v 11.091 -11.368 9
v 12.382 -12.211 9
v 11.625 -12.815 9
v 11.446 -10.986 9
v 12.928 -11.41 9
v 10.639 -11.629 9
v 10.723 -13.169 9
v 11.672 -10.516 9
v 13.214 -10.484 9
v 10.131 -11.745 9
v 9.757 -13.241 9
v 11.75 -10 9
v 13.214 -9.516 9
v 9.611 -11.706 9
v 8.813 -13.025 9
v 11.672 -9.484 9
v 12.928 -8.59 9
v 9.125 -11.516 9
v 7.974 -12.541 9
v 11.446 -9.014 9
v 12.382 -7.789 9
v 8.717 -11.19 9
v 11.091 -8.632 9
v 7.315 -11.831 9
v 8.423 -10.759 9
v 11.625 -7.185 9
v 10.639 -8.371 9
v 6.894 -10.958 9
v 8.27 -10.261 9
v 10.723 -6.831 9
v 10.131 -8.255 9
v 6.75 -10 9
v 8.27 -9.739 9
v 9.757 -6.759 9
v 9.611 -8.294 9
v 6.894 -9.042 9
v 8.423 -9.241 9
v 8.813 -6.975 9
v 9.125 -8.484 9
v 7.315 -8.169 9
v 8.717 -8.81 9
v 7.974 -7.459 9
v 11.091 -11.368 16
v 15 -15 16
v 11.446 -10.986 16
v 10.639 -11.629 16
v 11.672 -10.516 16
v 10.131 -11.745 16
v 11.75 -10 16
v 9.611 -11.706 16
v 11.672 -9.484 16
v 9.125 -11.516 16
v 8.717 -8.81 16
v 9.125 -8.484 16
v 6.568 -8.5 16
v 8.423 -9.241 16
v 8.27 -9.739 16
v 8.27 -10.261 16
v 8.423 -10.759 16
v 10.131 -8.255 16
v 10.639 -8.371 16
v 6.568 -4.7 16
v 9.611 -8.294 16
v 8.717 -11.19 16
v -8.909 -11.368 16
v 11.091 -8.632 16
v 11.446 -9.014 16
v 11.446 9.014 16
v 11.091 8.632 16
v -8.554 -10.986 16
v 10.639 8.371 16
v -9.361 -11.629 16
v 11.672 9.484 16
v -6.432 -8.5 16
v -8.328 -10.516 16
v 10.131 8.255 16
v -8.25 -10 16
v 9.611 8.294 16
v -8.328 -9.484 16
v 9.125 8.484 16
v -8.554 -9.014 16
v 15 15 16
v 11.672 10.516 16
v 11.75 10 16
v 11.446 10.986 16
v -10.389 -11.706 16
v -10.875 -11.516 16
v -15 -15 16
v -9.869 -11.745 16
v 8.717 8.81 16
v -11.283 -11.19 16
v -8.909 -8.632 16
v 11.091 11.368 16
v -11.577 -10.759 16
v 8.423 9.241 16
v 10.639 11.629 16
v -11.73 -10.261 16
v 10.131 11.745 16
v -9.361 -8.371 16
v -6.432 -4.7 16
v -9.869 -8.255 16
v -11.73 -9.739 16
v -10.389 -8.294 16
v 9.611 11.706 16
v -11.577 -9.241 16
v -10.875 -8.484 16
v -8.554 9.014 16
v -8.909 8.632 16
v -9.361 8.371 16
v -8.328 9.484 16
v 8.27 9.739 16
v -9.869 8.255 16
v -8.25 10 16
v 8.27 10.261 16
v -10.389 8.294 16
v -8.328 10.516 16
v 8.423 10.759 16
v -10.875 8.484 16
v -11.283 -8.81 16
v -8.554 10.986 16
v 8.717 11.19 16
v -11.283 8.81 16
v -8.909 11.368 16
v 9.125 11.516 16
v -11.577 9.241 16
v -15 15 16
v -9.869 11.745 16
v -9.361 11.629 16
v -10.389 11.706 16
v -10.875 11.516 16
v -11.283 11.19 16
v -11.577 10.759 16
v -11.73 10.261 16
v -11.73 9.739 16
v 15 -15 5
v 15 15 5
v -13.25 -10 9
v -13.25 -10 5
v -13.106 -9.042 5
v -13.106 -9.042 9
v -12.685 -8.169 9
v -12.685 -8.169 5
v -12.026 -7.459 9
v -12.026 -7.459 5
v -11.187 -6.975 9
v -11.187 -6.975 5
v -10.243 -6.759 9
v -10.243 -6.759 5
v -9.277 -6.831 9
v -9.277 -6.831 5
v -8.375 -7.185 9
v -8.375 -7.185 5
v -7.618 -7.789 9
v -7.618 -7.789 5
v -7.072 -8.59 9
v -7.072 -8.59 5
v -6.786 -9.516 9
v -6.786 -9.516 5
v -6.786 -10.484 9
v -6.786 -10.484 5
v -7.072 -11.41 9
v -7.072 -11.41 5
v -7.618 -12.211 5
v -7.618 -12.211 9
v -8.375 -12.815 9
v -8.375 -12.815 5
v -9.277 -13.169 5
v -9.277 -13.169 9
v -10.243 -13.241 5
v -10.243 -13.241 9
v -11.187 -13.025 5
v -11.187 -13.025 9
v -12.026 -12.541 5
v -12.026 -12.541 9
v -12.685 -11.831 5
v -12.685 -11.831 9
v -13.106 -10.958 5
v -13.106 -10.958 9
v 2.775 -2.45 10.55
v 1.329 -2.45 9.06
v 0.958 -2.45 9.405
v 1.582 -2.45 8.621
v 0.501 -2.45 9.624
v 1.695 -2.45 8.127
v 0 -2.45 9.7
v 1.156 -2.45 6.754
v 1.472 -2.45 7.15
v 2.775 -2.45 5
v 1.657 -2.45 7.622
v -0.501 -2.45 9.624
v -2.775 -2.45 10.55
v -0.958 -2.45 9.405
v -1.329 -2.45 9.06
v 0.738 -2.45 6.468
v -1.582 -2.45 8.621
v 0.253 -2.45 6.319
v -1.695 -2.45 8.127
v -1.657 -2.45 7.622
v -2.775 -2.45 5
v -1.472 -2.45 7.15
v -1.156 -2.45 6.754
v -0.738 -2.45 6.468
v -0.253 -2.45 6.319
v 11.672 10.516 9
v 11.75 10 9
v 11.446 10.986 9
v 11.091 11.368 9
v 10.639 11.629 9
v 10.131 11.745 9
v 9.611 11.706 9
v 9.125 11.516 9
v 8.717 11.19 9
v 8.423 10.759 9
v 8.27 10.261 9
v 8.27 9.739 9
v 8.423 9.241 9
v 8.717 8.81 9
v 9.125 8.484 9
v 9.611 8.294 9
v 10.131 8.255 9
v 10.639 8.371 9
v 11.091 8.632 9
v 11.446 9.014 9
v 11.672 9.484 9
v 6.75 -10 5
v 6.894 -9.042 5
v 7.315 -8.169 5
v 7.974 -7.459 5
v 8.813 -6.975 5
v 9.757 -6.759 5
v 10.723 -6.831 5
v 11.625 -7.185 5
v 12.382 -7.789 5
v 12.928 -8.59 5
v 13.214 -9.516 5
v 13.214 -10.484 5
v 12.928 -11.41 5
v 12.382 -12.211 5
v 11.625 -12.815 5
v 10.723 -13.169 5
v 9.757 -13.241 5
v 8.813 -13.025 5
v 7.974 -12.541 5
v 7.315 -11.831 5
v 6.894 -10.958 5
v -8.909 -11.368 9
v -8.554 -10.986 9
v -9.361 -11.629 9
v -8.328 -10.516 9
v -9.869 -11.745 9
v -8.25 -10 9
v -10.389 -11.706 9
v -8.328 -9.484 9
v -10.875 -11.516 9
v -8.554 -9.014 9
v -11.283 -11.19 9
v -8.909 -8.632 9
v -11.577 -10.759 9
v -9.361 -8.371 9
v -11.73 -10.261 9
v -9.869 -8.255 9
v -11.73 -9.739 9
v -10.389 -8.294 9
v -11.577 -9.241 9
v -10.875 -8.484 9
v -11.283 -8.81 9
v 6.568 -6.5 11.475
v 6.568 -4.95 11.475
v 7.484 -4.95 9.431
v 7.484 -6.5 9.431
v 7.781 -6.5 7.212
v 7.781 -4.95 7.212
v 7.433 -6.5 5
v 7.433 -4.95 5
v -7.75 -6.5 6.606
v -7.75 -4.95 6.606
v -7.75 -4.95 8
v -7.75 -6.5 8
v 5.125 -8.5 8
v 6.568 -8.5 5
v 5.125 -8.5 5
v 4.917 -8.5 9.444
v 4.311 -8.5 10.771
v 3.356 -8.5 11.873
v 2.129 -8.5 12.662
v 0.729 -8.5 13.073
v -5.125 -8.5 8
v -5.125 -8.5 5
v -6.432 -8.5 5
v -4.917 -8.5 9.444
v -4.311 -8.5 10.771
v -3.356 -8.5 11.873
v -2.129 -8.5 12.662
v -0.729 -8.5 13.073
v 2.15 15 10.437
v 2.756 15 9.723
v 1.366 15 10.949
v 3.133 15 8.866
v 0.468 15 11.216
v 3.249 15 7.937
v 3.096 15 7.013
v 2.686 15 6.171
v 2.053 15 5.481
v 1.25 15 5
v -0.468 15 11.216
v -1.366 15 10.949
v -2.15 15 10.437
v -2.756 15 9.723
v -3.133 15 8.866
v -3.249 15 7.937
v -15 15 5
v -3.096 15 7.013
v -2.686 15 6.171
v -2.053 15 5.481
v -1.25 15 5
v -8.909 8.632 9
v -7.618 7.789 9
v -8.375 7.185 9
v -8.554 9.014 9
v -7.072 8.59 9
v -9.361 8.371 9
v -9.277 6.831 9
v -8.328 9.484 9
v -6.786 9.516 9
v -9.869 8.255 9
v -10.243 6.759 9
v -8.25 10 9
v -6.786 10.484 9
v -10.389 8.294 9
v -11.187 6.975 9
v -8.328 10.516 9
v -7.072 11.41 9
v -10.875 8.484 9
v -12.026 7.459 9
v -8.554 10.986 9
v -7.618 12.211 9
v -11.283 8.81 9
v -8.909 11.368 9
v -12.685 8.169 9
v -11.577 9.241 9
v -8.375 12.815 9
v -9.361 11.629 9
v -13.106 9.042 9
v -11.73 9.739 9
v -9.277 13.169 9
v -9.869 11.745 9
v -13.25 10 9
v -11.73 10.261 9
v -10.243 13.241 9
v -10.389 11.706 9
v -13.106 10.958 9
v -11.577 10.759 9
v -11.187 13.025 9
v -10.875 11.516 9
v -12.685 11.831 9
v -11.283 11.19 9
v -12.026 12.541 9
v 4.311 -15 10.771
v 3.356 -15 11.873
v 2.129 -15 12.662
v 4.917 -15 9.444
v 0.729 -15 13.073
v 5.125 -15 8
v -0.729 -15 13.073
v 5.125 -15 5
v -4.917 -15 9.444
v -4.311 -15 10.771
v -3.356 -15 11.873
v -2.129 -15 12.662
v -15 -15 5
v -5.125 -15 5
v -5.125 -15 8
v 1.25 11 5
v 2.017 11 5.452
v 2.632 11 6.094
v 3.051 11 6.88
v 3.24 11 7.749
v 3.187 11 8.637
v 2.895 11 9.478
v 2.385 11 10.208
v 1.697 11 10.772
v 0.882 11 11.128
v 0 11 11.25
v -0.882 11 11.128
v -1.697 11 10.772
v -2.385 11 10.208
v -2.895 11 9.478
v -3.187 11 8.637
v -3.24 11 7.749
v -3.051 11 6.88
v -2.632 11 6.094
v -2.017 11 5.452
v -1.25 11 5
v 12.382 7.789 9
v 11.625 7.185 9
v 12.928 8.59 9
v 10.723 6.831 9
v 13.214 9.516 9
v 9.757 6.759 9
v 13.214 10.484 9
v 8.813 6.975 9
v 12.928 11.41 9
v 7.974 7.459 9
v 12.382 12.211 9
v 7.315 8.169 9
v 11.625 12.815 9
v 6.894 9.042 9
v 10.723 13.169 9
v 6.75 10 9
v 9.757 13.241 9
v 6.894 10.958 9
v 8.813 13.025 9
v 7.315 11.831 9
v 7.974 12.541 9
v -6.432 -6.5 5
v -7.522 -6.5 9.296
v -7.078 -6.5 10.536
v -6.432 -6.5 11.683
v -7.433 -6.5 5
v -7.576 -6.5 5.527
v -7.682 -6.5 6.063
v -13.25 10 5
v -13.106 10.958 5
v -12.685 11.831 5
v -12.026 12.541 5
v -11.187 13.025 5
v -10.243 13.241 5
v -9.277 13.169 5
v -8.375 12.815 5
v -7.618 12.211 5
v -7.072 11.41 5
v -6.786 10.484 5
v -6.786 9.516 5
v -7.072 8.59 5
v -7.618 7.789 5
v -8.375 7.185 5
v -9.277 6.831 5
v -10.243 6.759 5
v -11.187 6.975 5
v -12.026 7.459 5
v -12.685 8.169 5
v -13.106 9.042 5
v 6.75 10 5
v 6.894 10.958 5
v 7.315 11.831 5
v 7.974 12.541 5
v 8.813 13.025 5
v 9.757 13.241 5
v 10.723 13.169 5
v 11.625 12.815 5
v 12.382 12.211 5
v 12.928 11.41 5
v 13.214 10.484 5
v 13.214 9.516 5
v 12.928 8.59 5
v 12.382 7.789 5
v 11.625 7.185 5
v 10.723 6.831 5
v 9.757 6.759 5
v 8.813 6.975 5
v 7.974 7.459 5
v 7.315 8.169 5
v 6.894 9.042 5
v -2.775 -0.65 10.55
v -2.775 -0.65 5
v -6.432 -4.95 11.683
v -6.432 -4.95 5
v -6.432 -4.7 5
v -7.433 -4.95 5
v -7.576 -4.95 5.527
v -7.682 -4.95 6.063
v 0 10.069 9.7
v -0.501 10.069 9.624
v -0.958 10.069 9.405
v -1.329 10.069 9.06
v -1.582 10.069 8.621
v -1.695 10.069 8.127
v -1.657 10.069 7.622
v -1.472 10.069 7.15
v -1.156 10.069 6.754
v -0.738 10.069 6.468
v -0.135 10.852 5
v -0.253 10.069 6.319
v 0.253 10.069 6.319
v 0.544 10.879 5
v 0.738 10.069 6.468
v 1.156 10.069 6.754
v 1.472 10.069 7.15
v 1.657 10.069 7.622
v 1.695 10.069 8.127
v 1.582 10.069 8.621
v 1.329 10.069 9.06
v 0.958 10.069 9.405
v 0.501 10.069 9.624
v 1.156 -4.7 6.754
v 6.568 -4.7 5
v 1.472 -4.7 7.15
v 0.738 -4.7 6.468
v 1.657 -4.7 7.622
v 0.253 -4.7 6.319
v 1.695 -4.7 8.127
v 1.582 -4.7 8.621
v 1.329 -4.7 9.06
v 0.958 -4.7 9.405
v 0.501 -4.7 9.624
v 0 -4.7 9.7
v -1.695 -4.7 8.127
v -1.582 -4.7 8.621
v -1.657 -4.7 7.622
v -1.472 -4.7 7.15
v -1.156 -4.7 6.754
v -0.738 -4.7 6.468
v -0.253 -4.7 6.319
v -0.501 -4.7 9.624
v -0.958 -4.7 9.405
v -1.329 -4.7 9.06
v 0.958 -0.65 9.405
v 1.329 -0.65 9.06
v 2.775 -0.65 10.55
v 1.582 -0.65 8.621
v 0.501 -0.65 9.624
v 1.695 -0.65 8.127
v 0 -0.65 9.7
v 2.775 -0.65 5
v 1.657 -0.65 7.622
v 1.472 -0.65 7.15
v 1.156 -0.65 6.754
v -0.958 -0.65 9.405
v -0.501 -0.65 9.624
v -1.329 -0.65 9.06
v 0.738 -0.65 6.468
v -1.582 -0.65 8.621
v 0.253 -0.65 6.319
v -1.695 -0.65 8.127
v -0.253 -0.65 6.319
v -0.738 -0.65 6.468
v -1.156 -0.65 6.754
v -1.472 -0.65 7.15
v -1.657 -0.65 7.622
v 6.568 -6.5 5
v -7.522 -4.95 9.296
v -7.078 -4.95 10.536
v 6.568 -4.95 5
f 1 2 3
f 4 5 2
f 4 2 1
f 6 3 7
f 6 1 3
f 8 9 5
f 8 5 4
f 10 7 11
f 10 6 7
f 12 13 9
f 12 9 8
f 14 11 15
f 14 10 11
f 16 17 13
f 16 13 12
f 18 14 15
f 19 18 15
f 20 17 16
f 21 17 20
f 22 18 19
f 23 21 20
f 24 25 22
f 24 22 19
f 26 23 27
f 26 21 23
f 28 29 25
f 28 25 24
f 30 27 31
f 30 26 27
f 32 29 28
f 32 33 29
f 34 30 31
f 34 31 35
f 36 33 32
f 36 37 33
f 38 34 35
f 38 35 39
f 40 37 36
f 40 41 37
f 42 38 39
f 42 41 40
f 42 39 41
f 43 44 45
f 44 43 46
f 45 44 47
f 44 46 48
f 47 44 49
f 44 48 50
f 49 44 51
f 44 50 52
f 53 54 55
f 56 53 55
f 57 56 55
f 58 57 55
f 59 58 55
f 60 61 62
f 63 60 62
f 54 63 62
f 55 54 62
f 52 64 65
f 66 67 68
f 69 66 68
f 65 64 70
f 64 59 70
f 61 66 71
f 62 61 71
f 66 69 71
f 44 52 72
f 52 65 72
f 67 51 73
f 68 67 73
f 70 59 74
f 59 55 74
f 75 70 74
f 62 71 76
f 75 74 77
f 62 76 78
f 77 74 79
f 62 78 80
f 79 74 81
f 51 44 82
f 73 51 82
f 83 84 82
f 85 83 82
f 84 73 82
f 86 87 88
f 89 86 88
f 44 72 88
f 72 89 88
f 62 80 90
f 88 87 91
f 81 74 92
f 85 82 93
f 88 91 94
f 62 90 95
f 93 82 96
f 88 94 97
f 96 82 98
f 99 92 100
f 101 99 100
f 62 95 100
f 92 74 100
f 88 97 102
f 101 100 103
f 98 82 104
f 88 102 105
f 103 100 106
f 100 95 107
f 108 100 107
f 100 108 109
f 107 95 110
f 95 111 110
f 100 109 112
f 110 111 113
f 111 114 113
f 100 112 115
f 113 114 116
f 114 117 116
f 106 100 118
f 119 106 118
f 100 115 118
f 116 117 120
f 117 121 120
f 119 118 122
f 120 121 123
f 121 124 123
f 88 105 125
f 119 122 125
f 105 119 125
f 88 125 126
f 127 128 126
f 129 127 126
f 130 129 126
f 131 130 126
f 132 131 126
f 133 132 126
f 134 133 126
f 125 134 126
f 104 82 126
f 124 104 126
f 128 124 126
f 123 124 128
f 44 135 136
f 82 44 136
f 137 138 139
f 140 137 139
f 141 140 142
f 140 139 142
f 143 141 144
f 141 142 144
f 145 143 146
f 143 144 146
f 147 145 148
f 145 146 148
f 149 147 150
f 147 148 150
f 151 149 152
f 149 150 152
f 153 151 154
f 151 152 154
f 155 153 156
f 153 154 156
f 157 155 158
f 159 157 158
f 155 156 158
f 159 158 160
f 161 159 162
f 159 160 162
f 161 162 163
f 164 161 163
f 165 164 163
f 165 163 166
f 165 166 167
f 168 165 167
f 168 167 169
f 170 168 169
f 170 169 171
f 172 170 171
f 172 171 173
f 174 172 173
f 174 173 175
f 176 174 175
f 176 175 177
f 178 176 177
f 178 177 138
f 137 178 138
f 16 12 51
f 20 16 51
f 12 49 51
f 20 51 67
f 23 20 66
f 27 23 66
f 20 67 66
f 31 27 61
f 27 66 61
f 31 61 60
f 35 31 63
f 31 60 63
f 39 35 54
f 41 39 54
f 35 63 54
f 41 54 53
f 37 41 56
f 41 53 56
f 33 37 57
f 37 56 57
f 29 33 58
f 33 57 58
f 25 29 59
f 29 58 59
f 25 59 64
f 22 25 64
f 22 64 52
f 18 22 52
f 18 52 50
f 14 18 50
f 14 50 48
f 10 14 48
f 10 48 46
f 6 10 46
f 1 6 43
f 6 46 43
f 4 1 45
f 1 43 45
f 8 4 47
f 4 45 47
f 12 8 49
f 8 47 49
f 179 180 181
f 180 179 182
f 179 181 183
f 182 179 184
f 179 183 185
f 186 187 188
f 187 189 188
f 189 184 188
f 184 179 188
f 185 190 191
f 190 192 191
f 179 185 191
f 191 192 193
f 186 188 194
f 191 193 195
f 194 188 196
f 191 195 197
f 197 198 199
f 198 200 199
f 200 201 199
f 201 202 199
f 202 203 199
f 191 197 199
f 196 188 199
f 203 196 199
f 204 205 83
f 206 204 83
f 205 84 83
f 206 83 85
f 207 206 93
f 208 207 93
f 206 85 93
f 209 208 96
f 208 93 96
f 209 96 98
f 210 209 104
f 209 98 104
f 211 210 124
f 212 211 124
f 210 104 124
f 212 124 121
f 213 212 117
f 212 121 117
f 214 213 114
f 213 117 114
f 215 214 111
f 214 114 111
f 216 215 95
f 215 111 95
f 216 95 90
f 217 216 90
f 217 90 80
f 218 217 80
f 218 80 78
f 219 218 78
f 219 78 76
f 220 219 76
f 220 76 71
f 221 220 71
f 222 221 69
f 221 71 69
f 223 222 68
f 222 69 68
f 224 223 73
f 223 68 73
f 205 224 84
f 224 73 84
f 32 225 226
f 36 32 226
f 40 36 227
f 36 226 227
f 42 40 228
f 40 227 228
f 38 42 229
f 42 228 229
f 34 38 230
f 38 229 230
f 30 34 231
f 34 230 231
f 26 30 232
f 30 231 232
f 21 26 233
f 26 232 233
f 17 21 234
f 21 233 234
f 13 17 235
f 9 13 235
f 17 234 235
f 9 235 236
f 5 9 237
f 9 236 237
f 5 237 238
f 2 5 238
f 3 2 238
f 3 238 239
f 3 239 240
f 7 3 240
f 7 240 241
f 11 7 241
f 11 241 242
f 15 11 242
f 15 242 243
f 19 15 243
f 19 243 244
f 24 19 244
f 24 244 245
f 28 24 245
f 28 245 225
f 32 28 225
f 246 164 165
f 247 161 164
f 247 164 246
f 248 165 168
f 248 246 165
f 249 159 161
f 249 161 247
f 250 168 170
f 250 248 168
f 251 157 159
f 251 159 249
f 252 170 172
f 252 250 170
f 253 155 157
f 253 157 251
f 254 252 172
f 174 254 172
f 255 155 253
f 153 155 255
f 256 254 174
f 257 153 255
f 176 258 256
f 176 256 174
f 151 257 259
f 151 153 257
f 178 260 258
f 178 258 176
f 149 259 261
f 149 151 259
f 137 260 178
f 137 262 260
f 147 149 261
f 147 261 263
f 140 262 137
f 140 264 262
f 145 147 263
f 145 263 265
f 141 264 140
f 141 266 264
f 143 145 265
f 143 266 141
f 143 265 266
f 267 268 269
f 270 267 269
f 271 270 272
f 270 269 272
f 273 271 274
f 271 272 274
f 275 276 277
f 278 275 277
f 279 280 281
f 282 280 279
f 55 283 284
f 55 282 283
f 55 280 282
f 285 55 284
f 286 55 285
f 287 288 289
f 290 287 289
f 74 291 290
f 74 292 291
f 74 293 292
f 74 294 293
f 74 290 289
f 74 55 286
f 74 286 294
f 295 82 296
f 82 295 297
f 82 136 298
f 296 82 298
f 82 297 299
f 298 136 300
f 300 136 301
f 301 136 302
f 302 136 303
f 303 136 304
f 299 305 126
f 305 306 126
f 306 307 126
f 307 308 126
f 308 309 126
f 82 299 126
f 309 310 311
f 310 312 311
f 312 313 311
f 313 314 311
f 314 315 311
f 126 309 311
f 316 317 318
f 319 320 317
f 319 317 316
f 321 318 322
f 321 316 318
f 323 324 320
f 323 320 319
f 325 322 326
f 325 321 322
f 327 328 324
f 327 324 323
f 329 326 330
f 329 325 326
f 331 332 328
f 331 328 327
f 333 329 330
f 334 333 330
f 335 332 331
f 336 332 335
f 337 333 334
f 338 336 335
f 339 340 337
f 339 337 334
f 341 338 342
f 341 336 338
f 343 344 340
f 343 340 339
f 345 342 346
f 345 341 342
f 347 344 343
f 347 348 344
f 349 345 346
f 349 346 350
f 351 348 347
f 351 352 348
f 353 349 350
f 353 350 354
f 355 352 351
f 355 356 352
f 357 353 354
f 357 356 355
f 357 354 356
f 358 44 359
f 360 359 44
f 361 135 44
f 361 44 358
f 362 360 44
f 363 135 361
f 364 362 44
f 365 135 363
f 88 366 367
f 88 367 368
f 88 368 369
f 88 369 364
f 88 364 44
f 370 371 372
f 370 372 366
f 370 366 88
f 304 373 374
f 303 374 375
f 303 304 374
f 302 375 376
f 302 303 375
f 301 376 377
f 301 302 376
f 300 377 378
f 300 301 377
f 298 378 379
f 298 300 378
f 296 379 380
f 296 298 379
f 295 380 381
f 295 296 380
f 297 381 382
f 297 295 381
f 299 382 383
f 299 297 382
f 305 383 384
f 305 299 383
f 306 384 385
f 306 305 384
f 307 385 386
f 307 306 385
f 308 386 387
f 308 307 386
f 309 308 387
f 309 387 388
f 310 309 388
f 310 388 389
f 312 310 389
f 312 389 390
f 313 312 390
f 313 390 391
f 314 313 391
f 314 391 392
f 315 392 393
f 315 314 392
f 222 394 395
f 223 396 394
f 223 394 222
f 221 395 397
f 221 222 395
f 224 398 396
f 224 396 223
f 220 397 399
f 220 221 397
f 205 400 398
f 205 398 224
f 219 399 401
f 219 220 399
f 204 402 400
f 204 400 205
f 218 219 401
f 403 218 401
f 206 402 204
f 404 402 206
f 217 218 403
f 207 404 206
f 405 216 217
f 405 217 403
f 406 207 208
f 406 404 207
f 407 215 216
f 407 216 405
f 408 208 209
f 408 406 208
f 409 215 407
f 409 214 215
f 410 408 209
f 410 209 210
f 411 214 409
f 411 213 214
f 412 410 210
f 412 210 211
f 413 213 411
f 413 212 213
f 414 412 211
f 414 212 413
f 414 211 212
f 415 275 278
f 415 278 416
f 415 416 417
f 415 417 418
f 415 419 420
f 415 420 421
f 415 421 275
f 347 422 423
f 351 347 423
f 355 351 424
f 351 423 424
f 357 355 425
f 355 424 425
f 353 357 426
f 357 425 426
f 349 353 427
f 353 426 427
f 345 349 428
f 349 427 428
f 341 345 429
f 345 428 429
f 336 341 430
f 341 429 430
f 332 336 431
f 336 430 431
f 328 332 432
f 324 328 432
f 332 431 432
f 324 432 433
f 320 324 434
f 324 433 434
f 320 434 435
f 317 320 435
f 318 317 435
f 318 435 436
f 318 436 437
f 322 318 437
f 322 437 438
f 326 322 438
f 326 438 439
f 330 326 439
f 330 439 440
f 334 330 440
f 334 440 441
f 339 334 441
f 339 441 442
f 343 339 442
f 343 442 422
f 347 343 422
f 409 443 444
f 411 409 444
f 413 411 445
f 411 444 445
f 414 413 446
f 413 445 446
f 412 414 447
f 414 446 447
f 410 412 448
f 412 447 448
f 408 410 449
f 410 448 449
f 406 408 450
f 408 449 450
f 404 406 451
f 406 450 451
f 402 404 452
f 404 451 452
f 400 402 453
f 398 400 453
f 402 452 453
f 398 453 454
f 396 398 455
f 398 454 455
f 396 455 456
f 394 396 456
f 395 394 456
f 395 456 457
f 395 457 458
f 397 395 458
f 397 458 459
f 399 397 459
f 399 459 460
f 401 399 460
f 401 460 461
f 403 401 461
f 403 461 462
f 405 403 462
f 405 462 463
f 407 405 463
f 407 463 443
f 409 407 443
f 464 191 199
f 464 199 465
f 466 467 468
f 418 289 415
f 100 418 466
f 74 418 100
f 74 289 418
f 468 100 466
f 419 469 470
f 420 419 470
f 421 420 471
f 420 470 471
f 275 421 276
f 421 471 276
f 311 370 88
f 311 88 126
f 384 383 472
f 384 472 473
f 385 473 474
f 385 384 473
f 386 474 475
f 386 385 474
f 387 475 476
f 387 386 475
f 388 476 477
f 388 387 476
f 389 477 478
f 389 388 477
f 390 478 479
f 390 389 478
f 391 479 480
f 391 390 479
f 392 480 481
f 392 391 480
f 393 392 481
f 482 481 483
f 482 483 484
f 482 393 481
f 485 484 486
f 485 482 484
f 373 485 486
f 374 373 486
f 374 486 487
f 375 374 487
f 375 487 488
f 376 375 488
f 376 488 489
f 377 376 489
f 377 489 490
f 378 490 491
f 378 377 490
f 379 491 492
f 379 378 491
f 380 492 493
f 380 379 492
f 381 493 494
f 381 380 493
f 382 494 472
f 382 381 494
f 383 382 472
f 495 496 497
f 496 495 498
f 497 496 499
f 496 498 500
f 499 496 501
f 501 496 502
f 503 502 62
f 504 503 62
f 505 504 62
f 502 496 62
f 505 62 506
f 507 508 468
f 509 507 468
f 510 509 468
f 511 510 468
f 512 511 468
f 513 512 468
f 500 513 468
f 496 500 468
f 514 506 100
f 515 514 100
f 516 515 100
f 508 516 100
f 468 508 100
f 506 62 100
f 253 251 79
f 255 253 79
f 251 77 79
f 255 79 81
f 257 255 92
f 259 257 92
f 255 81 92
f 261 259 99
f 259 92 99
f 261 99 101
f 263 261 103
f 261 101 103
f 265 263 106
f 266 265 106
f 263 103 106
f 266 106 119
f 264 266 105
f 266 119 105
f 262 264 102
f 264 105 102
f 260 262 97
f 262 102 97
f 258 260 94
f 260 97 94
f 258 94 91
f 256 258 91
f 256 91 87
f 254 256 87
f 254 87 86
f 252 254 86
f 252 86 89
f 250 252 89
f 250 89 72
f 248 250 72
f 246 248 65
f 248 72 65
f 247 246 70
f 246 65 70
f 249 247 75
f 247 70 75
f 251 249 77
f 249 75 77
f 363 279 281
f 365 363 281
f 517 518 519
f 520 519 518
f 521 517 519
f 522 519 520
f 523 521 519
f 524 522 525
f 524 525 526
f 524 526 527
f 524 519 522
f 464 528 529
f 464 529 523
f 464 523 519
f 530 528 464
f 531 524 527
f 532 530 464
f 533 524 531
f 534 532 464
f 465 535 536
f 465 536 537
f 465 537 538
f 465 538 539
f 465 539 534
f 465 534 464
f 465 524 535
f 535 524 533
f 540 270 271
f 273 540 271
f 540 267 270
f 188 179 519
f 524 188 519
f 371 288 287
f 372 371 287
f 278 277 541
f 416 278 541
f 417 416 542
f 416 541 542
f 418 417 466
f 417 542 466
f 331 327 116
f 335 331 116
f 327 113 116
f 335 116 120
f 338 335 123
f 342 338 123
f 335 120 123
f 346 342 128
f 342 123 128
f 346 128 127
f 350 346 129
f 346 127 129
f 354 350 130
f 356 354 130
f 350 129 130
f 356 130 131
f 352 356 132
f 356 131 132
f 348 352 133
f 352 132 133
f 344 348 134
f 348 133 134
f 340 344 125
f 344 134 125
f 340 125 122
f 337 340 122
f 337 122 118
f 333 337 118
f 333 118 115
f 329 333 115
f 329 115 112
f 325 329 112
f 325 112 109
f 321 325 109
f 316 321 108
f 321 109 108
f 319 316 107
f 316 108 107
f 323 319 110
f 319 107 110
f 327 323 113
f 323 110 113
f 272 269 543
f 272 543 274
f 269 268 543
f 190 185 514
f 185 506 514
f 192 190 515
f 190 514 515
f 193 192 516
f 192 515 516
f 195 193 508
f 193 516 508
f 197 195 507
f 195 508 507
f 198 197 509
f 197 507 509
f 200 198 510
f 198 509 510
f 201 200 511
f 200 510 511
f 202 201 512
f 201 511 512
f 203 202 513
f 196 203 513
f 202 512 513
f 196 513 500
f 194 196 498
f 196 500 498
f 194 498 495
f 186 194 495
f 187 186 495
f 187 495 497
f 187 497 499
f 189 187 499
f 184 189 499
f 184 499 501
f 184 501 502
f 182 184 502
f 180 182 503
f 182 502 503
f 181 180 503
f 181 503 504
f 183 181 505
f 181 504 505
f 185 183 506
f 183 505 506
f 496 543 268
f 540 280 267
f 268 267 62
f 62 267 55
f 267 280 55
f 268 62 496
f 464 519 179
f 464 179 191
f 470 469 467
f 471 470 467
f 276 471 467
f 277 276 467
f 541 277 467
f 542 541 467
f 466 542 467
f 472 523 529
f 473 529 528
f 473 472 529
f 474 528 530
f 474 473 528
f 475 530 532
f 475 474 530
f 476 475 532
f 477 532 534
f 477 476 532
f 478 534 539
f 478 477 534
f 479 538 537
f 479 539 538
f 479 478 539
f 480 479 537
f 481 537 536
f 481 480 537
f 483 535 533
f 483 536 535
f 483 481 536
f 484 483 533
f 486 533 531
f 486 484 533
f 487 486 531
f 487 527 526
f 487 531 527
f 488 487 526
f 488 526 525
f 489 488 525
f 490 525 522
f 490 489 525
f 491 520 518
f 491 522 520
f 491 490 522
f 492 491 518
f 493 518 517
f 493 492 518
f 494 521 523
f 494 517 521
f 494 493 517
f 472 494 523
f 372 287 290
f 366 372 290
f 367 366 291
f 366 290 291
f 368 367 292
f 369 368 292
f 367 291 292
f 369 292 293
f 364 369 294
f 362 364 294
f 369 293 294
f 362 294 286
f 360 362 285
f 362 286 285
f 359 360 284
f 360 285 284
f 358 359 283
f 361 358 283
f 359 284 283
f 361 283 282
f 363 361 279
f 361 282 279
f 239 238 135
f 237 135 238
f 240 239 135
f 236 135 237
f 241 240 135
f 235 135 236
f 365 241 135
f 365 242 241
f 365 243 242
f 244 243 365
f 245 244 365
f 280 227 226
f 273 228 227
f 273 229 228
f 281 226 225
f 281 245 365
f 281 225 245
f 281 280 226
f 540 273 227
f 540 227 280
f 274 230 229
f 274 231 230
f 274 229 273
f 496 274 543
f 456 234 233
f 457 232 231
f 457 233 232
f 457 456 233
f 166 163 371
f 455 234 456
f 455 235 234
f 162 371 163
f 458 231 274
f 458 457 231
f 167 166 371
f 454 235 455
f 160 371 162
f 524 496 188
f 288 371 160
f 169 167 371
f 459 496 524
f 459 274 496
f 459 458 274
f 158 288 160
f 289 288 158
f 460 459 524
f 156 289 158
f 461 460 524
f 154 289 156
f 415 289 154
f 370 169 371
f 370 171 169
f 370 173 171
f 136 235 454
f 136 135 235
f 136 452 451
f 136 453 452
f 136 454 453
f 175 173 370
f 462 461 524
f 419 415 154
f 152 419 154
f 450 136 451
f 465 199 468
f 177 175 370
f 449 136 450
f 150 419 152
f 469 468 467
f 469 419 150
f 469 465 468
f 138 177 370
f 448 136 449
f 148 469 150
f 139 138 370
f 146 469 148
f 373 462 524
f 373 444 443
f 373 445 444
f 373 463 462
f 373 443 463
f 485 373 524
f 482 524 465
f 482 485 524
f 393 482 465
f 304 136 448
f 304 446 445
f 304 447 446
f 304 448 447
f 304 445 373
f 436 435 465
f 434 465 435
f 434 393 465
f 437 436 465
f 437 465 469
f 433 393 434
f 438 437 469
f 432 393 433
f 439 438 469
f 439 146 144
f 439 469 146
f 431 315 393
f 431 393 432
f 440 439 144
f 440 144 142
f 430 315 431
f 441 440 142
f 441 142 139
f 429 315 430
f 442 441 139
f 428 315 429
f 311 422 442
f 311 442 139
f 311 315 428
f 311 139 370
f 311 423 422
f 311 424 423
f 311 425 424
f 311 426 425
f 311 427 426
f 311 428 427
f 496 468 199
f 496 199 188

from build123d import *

# Parameters (mm, degrees)
SKETCH1_W                                        = 30
SKETCH1_H                                        = 30
BOSS_EXTRUDE1_DEPTH                              = 11
CUT_EXTRUDE1_DEPTH                               = 1.55
CUT_EXTRUDE2_DEPTH                               = 31.712375356
SKETCH7_W                                        = 5.55
SKETCH7_H                                        = 1.8
CUT_EXTRUDE3_DEPTH                               = 5.55
CBORE_FOR_M3_HEX_HEAD_MACHINE_SCREW1_D           = 3.5
CBORE_FOR_M3_HEX_HEAD_MACHINE_SCREW1_CBORE_D     = 6.5
CBORE_FOR_M3_HEX_HEAD_MACHINE_SCREW1_CBORE_DEPTH = 4
SKETCH10_W                                       = 1.7
SKETCH10_H                                       = 12.55
CUT_EXTRUDE4_DEPTH                               = 1.8
CUT_EXTRUDE4_DEPTH_BACK                          = 2
SKETCH14_W                                       = 13
SKETCH14_H                                       = 30


with BuildPart() as part:
    # Sketch1 → Boss-Extrude1 (new body)
    with BuildSketch(Plane(origin=(0, 0, 5), x_dir=(-1, 0, 0), z_dir=(0, 0, -1))):
        Rectangle(SKETCH1_W, SKETCH1_H)
    extrude(amount=-BOSS_EXTRUDE1_DEPTH)

    # Sketch2 → Cut-Extrude1 (cut)
    with BuildSketch(Plane(origin=(0, -4.95, 0), x_dir=(1, 0, 0), z_dir=(0, 1, 0))):
        with BuildLine():
            Line((7.432729441, -5), (-7.432729441, -5))
            ThreePointArc((-7.432729441, -5), (-7.633699531, -5.794473784), (-7.75, -6.605677687))
            Line((-7.75, -6.605677687), (-7.75, -8))
            ThreePointArc((-7.75, -8), (1.508365059, -14.936538374), (7.432729441, -5))
        make_face()
    extrude(amount=-CUT_EXTRUDE1_DEPTH, mode=Mode.SUBTRACT)

    # Sketch3 → Cut-Extrude2 (cut, through all)
    with BuildSketch(Plane(origin=(0, -6.5, 0), x_dir=(-1, 0, 0), z_dir=(0, 1, 0))):
        with BuildLine():
            Line((-5.125, 5), (5.125, 5))
            Line((5.125, 5), (5.125, 8))
            ThreePointArc((5.125, 8), (0, 13.125), (-5.125, 8))
            Line((-5.125, 8), (-5.125, 5))
        make_face()
    extrude(amount=-CUT_EXTRUDE2_DEPTH, mode=Mode.SUBTRACT)

    # Sketch7 → Cut-Extrude3 (cut)
    with BuildSketch(Plane(origin=(0, 0, 5), x_dir=(-1, 0, 0), z_dir=(0, 0, -1))):
        with Locations((0, -1.55)):
            Rectangle(SKETCH7_W, SKETCH7_H)
    extrude(amount=-CUT_EXTRUDE3_DEPTH, mode=Mode.SUBTRACT)

    # CBORE for M3 Hex Head Machine Screw1 (through all)
    with Locations(Plane(origin=(0, 0, 5), x_dir=(-1, 0, 0), z_dir=(0, 0, -1))):
        with Locations((-10, 10), (-10, -10), (10, -10), (10, 10)):
            CounterBoreHole(CBORE_FOR_M3_HEX_HEAD_MACHINE_SCREW1_D / 2, CBORE_FOR_M3_HEX_HEAD_MACHINE_SCREW1_CBORE_D / 2, CBORE_FOR_M3_HEX_HEAD_MACHINE_SCREW1_CBORE_DEPTH)

    # Sketch10 → Ø3.4 (3.4) Diameter Hole1 (revolve, cut)
    with BuildSketch(Plane(origin=(0, -2.45, 8), x_dir=(0, 0, 1), z_dir=(1, 0, 0))):
        with Locations((0.85, 6.275)):
            Rectangle(SKETCH10_W, SKETCH10_H)
    revolve(axis=Axis((0, 3.9, 8), (0, -1, 0)), mode=Mode.SUBTRACT)

    # Sketch12 → CSK for M3 Flat Head Machine Screw1 (revolve, cut)
    with BuildSketch(Plane(origin=(0, 15, 8), x_dir=(0, 0, 1), z_dir=(1, 0, 0))):
        Polygon((0, 0), (0, 30), (1.7, 30), (1.7, 4.931333959), (3.25, 4), (3.25, 0), align=None)
    revolve(axis=Axis((0, 21.35, 8), (0, -1, 0)), mode=Mode.SUBTRACT)

    # Sketch14 → Cut-Extrude4 (cut, two sides: drawn at the far end of the back side and taken through both)
    with BuildSketch(Plane(origin=(0, -6.5, 0), x_dir=(-1, 0, 0), z_dir=(0, 1, 0)).offset(-CUT_EXTRUDE4_DEPTH_BACK)):
        with Locations((-0.068435325, 5)):
            Rectangle(SKETCH14_W, SKETCH14_H)
    extrude(amount=CUT_EXTRUDE4_DEPTH + CUT_EXTRUDE4_DEPTH_BACK, mode=Mode.SUBTRACT)


solid = part.part
